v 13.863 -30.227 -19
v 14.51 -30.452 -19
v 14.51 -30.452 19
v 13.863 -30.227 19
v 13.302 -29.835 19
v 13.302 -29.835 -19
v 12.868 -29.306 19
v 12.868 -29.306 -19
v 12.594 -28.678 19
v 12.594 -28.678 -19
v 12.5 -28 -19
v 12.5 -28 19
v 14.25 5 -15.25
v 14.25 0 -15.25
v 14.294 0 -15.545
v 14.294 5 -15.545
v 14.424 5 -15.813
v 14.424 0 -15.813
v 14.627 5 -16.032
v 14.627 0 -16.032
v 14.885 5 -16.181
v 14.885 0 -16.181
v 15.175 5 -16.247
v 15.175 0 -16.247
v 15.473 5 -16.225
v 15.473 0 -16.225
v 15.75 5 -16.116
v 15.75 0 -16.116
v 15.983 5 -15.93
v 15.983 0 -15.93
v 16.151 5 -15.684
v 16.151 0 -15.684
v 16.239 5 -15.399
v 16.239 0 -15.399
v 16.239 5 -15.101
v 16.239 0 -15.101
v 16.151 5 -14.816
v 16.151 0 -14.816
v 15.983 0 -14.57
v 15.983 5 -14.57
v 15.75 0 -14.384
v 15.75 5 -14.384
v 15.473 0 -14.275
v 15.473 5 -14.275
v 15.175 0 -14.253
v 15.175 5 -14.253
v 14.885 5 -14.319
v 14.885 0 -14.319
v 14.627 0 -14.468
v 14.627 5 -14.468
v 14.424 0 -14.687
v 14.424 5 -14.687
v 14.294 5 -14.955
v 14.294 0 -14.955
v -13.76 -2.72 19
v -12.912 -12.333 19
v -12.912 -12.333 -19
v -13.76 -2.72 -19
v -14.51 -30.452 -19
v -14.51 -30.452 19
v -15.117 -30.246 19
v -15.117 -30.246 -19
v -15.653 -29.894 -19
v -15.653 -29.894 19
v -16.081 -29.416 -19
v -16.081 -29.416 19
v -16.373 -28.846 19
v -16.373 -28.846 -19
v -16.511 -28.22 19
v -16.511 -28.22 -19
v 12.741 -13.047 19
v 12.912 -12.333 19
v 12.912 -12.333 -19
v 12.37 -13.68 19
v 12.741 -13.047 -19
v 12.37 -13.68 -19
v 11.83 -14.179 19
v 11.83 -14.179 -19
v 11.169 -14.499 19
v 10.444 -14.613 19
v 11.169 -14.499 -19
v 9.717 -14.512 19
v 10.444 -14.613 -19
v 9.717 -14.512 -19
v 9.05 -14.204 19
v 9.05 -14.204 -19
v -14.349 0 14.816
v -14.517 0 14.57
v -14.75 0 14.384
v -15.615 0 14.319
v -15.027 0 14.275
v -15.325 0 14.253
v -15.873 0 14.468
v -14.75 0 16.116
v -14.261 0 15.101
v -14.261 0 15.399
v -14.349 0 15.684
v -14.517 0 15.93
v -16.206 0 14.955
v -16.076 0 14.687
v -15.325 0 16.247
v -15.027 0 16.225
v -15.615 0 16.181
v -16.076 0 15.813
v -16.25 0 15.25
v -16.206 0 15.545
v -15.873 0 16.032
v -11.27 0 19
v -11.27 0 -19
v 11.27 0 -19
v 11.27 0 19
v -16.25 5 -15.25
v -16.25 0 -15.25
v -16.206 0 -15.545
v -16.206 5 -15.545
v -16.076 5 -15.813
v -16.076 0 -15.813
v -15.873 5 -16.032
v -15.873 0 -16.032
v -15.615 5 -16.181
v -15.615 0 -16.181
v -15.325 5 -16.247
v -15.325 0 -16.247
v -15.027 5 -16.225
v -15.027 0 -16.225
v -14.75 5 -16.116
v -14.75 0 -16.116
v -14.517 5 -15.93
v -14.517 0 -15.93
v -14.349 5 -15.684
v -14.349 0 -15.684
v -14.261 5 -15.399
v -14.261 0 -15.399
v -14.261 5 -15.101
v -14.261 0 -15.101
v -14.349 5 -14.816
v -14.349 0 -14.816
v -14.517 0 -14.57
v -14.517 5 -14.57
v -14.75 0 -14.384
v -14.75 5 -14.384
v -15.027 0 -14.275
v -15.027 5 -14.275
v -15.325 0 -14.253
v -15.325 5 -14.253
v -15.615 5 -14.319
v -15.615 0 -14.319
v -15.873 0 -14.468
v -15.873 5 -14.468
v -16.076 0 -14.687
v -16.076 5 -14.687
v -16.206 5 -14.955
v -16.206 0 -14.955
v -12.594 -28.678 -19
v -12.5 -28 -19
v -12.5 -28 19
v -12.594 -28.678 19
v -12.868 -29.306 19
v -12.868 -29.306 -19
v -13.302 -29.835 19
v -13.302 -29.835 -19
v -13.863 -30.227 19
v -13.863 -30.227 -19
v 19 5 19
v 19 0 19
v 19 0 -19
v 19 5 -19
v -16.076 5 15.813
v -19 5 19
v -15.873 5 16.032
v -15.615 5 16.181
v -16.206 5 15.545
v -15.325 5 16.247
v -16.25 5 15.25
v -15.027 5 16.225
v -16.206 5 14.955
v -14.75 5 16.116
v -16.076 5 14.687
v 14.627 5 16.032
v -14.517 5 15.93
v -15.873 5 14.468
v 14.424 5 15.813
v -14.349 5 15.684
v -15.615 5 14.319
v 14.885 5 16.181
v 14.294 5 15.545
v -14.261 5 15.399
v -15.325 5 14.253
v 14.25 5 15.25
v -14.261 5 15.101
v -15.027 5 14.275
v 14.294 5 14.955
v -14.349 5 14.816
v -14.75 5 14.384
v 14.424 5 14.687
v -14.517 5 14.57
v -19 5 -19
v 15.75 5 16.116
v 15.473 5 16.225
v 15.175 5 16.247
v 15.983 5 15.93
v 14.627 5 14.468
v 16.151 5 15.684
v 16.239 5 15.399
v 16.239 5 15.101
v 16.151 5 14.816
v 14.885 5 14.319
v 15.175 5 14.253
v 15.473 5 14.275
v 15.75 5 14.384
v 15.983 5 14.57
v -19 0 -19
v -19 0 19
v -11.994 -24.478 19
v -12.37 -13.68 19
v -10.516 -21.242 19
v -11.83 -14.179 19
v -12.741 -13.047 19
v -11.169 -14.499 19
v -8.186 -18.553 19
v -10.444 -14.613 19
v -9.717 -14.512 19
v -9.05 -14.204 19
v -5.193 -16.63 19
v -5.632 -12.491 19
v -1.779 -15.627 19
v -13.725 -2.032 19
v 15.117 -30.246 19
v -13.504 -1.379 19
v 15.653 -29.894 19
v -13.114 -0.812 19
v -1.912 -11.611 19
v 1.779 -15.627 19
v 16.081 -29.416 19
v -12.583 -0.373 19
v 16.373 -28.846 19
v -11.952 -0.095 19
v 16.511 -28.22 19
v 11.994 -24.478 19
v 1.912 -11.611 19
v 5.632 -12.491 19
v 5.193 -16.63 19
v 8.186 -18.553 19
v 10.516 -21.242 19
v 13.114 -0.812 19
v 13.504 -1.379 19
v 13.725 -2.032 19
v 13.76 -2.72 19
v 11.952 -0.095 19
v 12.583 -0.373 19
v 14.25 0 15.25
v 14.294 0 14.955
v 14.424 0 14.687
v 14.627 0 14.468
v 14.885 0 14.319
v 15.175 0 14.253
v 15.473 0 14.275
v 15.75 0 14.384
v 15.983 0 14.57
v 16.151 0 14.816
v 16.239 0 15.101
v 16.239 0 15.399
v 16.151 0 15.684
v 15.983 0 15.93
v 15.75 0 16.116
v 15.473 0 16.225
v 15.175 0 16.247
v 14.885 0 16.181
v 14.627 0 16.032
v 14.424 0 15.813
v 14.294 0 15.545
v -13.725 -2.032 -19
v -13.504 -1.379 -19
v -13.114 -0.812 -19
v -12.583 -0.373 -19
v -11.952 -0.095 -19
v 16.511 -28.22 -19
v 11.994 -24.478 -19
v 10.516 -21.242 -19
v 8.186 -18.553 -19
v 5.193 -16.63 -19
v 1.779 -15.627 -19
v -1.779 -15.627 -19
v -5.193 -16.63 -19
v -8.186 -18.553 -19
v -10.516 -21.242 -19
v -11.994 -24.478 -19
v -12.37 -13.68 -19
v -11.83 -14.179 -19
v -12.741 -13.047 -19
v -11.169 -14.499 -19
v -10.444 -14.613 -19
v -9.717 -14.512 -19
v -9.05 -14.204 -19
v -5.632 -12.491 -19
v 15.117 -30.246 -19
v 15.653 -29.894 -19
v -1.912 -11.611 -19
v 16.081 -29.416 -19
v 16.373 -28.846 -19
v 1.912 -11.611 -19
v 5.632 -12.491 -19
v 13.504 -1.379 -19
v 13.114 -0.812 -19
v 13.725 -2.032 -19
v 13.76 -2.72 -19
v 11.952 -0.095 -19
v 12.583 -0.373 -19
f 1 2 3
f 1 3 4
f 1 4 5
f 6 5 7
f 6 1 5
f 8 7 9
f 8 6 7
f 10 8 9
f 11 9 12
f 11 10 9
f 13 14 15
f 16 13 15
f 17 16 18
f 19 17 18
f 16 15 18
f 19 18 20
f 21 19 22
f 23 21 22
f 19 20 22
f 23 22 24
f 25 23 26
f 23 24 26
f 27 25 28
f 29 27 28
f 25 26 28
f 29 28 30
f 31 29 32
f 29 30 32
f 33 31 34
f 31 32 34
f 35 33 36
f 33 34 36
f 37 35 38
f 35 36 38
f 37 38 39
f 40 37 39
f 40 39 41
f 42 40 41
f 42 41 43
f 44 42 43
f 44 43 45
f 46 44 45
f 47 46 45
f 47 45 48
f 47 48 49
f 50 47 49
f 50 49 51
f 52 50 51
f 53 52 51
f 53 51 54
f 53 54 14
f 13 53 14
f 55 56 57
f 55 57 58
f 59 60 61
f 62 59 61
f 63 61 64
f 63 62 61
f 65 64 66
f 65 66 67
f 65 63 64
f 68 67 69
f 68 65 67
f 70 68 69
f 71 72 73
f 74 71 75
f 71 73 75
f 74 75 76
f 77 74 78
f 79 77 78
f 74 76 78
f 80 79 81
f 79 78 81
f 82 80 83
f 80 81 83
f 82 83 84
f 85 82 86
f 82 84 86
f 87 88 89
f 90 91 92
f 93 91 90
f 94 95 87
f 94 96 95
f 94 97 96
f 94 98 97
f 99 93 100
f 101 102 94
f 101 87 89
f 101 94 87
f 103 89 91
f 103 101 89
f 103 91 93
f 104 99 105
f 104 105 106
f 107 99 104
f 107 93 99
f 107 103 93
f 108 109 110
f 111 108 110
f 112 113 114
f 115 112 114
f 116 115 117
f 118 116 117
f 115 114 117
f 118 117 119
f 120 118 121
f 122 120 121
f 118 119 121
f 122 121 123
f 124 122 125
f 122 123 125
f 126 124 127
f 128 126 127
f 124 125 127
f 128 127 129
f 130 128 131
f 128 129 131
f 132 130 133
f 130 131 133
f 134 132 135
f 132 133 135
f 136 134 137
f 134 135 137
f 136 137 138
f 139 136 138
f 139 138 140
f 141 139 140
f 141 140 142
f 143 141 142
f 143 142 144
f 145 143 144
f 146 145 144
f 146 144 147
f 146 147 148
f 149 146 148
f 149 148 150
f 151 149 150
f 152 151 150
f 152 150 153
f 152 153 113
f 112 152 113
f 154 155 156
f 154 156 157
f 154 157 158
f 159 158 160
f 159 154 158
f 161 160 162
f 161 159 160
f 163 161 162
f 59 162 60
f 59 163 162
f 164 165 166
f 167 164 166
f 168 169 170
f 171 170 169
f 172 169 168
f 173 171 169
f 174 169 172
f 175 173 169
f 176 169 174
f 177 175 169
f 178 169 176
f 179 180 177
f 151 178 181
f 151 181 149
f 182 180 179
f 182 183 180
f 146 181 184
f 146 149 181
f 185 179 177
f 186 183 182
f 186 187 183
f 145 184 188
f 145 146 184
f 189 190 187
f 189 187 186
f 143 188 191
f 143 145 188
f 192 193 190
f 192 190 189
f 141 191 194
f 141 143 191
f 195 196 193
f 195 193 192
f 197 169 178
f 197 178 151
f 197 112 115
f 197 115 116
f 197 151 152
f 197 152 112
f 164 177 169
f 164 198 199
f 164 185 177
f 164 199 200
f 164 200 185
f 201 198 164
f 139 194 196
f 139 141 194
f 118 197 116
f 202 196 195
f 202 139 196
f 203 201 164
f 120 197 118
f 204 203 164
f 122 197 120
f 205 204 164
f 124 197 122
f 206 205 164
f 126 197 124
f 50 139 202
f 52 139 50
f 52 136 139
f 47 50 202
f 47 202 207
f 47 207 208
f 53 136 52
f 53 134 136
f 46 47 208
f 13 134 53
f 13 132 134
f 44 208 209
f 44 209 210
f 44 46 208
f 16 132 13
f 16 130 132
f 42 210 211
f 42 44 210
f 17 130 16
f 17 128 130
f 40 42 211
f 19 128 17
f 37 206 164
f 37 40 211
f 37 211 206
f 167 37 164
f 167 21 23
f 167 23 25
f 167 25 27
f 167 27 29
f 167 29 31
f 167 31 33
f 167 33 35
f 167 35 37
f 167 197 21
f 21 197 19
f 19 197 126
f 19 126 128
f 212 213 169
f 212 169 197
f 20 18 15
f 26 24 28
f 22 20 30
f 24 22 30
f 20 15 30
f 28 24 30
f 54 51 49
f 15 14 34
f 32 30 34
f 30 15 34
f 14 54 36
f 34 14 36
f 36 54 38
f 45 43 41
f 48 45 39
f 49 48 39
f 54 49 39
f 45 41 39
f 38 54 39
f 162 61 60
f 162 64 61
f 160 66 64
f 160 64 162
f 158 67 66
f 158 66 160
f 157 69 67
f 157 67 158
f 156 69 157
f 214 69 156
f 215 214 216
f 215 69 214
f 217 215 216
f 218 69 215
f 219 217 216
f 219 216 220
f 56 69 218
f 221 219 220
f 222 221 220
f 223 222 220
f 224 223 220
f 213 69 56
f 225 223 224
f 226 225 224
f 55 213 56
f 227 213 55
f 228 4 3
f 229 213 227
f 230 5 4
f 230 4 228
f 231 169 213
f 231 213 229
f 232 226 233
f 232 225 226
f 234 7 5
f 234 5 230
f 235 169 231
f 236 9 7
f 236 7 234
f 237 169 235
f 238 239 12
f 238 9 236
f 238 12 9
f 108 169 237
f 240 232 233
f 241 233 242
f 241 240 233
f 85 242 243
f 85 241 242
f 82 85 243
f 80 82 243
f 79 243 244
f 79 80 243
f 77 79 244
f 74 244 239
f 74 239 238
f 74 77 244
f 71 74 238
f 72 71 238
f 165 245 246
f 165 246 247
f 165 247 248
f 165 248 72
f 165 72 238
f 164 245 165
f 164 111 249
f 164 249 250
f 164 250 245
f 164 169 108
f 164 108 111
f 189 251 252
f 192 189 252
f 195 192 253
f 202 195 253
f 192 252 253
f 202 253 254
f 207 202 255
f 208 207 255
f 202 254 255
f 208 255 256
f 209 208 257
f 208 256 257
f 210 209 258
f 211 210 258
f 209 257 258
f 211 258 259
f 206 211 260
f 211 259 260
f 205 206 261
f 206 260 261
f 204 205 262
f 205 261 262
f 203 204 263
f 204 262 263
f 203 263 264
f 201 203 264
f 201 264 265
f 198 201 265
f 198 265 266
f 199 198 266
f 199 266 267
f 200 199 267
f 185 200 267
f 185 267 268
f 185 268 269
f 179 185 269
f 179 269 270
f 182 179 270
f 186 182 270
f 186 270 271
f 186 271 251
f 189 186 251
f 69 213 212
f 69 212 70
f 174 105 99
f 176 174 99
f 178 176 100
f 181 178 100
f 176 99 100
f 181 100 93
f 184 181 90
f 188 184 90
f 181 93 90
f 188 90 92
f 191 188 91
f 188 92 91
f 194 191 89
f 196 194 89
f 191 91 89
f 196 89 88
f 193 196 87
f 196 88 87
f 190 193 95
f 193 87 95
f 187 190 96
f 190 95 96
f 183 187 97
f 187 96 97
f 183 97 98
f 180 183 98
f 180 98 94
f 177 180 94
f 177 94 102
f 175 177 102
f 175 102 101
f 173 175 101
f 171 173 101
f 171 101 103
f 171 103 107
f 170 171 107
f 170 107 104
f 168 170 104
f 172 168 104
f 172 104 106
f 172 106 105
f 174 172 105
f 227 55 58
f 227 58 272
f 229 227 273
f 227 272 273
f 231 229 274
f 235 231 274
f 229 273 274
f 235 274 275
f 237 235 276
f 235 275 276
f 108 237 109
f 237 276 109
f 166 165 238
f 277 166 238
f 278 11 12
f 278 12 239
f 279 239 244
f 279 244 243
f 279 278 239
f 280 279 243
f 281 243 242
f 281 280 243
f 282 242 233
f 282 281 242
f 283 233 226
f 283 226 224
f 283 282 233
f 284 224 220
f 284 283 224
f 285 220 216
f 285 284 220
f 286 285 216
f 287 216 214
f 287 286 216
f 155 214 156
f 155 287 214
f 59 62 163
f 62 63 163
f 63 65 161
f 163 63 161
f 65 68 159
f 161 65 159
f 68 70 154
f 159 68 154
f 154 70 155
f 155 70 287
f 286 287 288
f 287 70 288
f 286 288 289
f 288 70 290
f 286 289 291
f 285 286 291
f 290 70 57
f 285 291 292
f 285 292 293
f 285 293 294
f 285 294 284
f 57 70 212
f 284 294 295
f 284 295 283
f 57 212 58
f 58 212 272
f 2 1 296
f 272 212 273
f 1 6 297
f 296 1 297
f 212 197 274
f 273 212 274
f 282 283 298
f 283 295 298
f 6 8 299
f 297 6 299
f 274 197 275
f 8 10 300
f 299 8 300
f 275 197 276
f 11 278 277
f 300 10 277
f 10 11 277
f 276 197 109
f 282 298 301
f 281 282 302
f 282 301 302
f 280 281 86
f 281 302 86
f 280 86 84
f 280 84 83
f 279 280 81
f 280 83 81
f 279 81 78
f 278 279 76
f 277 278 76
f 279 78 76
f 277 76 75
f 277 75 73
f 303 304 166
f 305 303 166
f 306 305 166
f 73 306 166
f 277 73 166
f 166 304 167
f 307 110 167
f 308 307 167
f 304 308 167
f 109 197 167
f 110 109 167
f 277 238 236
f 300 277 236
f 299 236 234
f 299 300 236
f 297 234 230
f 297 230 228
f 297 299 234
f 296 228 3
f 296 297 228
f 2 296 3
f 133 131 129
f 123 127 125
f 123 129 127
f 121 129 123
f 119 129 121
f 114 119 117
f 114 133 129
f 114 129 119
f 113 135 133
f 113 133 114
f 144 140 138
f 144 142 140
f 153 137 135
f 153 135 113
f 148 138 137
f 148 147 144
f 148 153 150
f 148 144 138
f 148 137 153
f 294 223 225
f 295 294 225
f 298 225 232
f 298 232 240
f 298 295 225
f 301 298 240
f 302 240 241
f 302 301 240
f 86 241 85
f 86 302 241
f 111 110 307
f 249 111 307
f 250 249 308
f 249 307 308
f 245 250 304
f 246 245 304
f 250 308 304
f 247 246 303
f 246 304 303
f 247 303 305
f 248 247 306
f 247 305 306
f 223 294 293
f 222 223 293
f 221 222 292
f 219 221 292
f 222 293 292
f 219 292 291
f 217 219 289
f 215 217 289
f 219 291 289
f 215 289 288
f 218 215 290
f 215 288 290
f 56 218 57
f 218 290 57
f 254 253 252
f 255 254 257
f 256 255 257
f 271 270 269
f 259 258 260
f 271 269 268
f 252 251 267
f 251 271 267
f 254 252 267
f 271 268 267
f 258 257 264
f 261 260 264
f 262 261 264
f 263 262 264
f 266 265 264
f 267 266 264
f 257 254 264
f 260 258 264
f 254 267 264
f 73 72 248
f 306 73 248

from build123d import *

# Parameters (mm, degrees)
SKETCH1_W                = 38
SKETCH1_H                = 38
BOSS_EXTRUDE1_DEPTH      = 5
F_2_0_2_DIAMETER_HOLE1_D = 2
BOSS_EXTRUDE3_START      = -19
BOSS_EXTRUDE3_DEPTH      = 38
BOSS_EXTRUDE4_START      = 19
BOSS_EXTRUDE4_DEPTH      = 38
FILLET5_START            = -20
FILLET5_DEPTH            = 40
FILLET5_START_2          = -19
FILLET5_2_DEPTH          = 38


with BuildPart() as part:
    # Sketch1 → Boss-Extrude1 (new body)
    with BuildSketch(Plane(origin=(0, 0, 0), x_dir=(1, 0, 0), z_dir=(0, 1, 0))):
        Rectangle(SKETCH1_W, SKETCH1_H)
    extrude(amount=BOSS_EXTRUDE1_DEPTH)

    # Ø2.0 (2) Diameter Hole1 (through all)
    with Locations(Plane(origin=(0, 5, 0), x_dir=(1, 0, 0), z_dir=(0, 1, 0))):
        with Locations((-15.25, 15.25), (15.25, 15.25), (15.25, -15.25), (-15.25, -15.25)):
            Hole(F_2_0_2_DIAMETER_HOLE1_D / 2)



with BuildPart() as body_2:
    # Sketch10 → Boss-Extrude3 (new body)
    with BuildSketch(Plane.XY.offset(BOSS_EXTRUDE3_START)):
        with BuildLine():
            Line((-12.247448714, -30.5), (-16.30950643, -30.5))
            ThreePointArc((-16.30950643, -30.5), (0, -11.5), (16.30950643, -30.5))
            Line((16.30950643, -30.5), (12.247448714, -30.5))
            ThreePointArc((12.247448714, -30.5), (0, -15.5), (-12.247448714, -30.5))
        make_face()
    extrude(amount=BOSS_EXTRUDE3_DEPTH)


with BuildPart() as part_1:
    add(part.part)

    add(body_2.part)  # Boss-Extrude4 merges body 2
    # Sketch11 → Boss-Extrude4 (add)
    with BuildSketch(Plane.XY.offset(BOSS_EXTRUDE4_START)):
        Polygon((-19, 0), (-16.30950643, -30.5), (-12.481964126, -17.208773398), (-14, 0), align=None)
    boss_extrude4 = extrude(amount=-BOSS_EXTRUDE4_DEPTH)

    # Mirror1: Boss-Extrude4 across plane
    add(boss_extrude4.mirror(Plane(origin=(0, 0, 0), x_dir=(0, 0, 1), z_dir=(1, 0, 0))))

    # Fillet5: read off the stored shape, not the designer's step
    # Fillet5 outline → Fillet5 (cut)
    with BuildSketch(Plane.XY.offset(FILLET5_START)):
        with BuildLine():
            ThreePointArc((16.51066015, -28.219679197), (15.881955848, -29.668637648), (14.510165322, -30.451542777))
            ThreePointArc((14.510165322, -30.451542777), (13.066791954, -29.585151934), (12.5, -28))
            ThreePointArc((12.5, -28), (12.436701913, -29.256362025), (12.247448714, -30.5))
            Line((12.247448714, -30.5), (16.30950643, -30.5))
            ThreePointArc((16.30950643, -30.5), (16.436174742, -29.449882703), (16.495299812, -28.393807221))
            Line((16.495299812, -28.393807221), (16.51066015, -28.219679197))
        make_face()
        with BuildLine():
            ThreePointArc((-12.247448714, -30.5), (-12.436701913, -29.256362025), (-12.5, -28))
            ThreePointArc((-12.5, -28), (-13.066791954, -29.585151934), (-14.510165322, -30.451542777))
            ThreePointArc((-14.510165322, -30.451542777), (-15.881955848, -29.668637648), (-16.51066015, -28.219679197))
            Line((-16.51066015, -28.219679197), (-16.495299812, -28.393807221))
            ThreePointArc((-16.495299812, -28.393807221), (-16.436174742, -29.449882703), (-16.30950643, -30.5))
            Line((-16.30950643, -30.5), (-12.247448714, -30.5))
        make_face()
    extrude(amount=FILLET5_DEPTH, mode=Mode.SUBTRACT)

    # Fillet5 2 outline → Fillet5 2 (add)
    with BuildSketch(Plane.XY.offset(FILLET5_START_2)):
        with BuildLine():
            Line((12.481964126, -17.208773398), (12.912072208, -12.33297787))
            ThreePointArc((12.912072208, -12.33297787), (11.511662087, -14.363204389), (9.050460767, -14.203654111))
            ThreePointArc((9.050460767, -14.203654111), (10.870557296, -15.587063841), (12.481964126, -17.208773398))
        make_face()
        with BuildLine():
            ThreePointArc((11.269759694, 0), (13.113559845, -0.811686936), (13.7600892, -2.719679197))
            Line((13.7600892, -2.719679197), (14, 0))
            Line((14, 0), (11.269759694, 0))
        make_face()
        with BuildLine():
            ThreePointArc((-12.481964126, -17.208773398), (-10.870557296, -15.587063841), (-9.050460767, -14.20365411))
            ThreePointArc((-9.050460767, -14.20365411), (-11.511662087, -14.363204389), (-12.912072208, -12.33297787))
            Line((-12.912072208, -12.33297787), (-12.481964126, -17.208773398))
        make_face()
        with BuildLine():
            ThreePointArc((-13.7600892, -2.719679197), (-13.113559845, -0.811686936), (-11.269759694, 0))
            Line((-11.269759694, 0), (-14, 0))
            Line((-14, 0), (-13.7600892, -2.719679197))
        make_face()
    extrude(amount=FILLET5_2_DEPTH)


solid = part_1.part
